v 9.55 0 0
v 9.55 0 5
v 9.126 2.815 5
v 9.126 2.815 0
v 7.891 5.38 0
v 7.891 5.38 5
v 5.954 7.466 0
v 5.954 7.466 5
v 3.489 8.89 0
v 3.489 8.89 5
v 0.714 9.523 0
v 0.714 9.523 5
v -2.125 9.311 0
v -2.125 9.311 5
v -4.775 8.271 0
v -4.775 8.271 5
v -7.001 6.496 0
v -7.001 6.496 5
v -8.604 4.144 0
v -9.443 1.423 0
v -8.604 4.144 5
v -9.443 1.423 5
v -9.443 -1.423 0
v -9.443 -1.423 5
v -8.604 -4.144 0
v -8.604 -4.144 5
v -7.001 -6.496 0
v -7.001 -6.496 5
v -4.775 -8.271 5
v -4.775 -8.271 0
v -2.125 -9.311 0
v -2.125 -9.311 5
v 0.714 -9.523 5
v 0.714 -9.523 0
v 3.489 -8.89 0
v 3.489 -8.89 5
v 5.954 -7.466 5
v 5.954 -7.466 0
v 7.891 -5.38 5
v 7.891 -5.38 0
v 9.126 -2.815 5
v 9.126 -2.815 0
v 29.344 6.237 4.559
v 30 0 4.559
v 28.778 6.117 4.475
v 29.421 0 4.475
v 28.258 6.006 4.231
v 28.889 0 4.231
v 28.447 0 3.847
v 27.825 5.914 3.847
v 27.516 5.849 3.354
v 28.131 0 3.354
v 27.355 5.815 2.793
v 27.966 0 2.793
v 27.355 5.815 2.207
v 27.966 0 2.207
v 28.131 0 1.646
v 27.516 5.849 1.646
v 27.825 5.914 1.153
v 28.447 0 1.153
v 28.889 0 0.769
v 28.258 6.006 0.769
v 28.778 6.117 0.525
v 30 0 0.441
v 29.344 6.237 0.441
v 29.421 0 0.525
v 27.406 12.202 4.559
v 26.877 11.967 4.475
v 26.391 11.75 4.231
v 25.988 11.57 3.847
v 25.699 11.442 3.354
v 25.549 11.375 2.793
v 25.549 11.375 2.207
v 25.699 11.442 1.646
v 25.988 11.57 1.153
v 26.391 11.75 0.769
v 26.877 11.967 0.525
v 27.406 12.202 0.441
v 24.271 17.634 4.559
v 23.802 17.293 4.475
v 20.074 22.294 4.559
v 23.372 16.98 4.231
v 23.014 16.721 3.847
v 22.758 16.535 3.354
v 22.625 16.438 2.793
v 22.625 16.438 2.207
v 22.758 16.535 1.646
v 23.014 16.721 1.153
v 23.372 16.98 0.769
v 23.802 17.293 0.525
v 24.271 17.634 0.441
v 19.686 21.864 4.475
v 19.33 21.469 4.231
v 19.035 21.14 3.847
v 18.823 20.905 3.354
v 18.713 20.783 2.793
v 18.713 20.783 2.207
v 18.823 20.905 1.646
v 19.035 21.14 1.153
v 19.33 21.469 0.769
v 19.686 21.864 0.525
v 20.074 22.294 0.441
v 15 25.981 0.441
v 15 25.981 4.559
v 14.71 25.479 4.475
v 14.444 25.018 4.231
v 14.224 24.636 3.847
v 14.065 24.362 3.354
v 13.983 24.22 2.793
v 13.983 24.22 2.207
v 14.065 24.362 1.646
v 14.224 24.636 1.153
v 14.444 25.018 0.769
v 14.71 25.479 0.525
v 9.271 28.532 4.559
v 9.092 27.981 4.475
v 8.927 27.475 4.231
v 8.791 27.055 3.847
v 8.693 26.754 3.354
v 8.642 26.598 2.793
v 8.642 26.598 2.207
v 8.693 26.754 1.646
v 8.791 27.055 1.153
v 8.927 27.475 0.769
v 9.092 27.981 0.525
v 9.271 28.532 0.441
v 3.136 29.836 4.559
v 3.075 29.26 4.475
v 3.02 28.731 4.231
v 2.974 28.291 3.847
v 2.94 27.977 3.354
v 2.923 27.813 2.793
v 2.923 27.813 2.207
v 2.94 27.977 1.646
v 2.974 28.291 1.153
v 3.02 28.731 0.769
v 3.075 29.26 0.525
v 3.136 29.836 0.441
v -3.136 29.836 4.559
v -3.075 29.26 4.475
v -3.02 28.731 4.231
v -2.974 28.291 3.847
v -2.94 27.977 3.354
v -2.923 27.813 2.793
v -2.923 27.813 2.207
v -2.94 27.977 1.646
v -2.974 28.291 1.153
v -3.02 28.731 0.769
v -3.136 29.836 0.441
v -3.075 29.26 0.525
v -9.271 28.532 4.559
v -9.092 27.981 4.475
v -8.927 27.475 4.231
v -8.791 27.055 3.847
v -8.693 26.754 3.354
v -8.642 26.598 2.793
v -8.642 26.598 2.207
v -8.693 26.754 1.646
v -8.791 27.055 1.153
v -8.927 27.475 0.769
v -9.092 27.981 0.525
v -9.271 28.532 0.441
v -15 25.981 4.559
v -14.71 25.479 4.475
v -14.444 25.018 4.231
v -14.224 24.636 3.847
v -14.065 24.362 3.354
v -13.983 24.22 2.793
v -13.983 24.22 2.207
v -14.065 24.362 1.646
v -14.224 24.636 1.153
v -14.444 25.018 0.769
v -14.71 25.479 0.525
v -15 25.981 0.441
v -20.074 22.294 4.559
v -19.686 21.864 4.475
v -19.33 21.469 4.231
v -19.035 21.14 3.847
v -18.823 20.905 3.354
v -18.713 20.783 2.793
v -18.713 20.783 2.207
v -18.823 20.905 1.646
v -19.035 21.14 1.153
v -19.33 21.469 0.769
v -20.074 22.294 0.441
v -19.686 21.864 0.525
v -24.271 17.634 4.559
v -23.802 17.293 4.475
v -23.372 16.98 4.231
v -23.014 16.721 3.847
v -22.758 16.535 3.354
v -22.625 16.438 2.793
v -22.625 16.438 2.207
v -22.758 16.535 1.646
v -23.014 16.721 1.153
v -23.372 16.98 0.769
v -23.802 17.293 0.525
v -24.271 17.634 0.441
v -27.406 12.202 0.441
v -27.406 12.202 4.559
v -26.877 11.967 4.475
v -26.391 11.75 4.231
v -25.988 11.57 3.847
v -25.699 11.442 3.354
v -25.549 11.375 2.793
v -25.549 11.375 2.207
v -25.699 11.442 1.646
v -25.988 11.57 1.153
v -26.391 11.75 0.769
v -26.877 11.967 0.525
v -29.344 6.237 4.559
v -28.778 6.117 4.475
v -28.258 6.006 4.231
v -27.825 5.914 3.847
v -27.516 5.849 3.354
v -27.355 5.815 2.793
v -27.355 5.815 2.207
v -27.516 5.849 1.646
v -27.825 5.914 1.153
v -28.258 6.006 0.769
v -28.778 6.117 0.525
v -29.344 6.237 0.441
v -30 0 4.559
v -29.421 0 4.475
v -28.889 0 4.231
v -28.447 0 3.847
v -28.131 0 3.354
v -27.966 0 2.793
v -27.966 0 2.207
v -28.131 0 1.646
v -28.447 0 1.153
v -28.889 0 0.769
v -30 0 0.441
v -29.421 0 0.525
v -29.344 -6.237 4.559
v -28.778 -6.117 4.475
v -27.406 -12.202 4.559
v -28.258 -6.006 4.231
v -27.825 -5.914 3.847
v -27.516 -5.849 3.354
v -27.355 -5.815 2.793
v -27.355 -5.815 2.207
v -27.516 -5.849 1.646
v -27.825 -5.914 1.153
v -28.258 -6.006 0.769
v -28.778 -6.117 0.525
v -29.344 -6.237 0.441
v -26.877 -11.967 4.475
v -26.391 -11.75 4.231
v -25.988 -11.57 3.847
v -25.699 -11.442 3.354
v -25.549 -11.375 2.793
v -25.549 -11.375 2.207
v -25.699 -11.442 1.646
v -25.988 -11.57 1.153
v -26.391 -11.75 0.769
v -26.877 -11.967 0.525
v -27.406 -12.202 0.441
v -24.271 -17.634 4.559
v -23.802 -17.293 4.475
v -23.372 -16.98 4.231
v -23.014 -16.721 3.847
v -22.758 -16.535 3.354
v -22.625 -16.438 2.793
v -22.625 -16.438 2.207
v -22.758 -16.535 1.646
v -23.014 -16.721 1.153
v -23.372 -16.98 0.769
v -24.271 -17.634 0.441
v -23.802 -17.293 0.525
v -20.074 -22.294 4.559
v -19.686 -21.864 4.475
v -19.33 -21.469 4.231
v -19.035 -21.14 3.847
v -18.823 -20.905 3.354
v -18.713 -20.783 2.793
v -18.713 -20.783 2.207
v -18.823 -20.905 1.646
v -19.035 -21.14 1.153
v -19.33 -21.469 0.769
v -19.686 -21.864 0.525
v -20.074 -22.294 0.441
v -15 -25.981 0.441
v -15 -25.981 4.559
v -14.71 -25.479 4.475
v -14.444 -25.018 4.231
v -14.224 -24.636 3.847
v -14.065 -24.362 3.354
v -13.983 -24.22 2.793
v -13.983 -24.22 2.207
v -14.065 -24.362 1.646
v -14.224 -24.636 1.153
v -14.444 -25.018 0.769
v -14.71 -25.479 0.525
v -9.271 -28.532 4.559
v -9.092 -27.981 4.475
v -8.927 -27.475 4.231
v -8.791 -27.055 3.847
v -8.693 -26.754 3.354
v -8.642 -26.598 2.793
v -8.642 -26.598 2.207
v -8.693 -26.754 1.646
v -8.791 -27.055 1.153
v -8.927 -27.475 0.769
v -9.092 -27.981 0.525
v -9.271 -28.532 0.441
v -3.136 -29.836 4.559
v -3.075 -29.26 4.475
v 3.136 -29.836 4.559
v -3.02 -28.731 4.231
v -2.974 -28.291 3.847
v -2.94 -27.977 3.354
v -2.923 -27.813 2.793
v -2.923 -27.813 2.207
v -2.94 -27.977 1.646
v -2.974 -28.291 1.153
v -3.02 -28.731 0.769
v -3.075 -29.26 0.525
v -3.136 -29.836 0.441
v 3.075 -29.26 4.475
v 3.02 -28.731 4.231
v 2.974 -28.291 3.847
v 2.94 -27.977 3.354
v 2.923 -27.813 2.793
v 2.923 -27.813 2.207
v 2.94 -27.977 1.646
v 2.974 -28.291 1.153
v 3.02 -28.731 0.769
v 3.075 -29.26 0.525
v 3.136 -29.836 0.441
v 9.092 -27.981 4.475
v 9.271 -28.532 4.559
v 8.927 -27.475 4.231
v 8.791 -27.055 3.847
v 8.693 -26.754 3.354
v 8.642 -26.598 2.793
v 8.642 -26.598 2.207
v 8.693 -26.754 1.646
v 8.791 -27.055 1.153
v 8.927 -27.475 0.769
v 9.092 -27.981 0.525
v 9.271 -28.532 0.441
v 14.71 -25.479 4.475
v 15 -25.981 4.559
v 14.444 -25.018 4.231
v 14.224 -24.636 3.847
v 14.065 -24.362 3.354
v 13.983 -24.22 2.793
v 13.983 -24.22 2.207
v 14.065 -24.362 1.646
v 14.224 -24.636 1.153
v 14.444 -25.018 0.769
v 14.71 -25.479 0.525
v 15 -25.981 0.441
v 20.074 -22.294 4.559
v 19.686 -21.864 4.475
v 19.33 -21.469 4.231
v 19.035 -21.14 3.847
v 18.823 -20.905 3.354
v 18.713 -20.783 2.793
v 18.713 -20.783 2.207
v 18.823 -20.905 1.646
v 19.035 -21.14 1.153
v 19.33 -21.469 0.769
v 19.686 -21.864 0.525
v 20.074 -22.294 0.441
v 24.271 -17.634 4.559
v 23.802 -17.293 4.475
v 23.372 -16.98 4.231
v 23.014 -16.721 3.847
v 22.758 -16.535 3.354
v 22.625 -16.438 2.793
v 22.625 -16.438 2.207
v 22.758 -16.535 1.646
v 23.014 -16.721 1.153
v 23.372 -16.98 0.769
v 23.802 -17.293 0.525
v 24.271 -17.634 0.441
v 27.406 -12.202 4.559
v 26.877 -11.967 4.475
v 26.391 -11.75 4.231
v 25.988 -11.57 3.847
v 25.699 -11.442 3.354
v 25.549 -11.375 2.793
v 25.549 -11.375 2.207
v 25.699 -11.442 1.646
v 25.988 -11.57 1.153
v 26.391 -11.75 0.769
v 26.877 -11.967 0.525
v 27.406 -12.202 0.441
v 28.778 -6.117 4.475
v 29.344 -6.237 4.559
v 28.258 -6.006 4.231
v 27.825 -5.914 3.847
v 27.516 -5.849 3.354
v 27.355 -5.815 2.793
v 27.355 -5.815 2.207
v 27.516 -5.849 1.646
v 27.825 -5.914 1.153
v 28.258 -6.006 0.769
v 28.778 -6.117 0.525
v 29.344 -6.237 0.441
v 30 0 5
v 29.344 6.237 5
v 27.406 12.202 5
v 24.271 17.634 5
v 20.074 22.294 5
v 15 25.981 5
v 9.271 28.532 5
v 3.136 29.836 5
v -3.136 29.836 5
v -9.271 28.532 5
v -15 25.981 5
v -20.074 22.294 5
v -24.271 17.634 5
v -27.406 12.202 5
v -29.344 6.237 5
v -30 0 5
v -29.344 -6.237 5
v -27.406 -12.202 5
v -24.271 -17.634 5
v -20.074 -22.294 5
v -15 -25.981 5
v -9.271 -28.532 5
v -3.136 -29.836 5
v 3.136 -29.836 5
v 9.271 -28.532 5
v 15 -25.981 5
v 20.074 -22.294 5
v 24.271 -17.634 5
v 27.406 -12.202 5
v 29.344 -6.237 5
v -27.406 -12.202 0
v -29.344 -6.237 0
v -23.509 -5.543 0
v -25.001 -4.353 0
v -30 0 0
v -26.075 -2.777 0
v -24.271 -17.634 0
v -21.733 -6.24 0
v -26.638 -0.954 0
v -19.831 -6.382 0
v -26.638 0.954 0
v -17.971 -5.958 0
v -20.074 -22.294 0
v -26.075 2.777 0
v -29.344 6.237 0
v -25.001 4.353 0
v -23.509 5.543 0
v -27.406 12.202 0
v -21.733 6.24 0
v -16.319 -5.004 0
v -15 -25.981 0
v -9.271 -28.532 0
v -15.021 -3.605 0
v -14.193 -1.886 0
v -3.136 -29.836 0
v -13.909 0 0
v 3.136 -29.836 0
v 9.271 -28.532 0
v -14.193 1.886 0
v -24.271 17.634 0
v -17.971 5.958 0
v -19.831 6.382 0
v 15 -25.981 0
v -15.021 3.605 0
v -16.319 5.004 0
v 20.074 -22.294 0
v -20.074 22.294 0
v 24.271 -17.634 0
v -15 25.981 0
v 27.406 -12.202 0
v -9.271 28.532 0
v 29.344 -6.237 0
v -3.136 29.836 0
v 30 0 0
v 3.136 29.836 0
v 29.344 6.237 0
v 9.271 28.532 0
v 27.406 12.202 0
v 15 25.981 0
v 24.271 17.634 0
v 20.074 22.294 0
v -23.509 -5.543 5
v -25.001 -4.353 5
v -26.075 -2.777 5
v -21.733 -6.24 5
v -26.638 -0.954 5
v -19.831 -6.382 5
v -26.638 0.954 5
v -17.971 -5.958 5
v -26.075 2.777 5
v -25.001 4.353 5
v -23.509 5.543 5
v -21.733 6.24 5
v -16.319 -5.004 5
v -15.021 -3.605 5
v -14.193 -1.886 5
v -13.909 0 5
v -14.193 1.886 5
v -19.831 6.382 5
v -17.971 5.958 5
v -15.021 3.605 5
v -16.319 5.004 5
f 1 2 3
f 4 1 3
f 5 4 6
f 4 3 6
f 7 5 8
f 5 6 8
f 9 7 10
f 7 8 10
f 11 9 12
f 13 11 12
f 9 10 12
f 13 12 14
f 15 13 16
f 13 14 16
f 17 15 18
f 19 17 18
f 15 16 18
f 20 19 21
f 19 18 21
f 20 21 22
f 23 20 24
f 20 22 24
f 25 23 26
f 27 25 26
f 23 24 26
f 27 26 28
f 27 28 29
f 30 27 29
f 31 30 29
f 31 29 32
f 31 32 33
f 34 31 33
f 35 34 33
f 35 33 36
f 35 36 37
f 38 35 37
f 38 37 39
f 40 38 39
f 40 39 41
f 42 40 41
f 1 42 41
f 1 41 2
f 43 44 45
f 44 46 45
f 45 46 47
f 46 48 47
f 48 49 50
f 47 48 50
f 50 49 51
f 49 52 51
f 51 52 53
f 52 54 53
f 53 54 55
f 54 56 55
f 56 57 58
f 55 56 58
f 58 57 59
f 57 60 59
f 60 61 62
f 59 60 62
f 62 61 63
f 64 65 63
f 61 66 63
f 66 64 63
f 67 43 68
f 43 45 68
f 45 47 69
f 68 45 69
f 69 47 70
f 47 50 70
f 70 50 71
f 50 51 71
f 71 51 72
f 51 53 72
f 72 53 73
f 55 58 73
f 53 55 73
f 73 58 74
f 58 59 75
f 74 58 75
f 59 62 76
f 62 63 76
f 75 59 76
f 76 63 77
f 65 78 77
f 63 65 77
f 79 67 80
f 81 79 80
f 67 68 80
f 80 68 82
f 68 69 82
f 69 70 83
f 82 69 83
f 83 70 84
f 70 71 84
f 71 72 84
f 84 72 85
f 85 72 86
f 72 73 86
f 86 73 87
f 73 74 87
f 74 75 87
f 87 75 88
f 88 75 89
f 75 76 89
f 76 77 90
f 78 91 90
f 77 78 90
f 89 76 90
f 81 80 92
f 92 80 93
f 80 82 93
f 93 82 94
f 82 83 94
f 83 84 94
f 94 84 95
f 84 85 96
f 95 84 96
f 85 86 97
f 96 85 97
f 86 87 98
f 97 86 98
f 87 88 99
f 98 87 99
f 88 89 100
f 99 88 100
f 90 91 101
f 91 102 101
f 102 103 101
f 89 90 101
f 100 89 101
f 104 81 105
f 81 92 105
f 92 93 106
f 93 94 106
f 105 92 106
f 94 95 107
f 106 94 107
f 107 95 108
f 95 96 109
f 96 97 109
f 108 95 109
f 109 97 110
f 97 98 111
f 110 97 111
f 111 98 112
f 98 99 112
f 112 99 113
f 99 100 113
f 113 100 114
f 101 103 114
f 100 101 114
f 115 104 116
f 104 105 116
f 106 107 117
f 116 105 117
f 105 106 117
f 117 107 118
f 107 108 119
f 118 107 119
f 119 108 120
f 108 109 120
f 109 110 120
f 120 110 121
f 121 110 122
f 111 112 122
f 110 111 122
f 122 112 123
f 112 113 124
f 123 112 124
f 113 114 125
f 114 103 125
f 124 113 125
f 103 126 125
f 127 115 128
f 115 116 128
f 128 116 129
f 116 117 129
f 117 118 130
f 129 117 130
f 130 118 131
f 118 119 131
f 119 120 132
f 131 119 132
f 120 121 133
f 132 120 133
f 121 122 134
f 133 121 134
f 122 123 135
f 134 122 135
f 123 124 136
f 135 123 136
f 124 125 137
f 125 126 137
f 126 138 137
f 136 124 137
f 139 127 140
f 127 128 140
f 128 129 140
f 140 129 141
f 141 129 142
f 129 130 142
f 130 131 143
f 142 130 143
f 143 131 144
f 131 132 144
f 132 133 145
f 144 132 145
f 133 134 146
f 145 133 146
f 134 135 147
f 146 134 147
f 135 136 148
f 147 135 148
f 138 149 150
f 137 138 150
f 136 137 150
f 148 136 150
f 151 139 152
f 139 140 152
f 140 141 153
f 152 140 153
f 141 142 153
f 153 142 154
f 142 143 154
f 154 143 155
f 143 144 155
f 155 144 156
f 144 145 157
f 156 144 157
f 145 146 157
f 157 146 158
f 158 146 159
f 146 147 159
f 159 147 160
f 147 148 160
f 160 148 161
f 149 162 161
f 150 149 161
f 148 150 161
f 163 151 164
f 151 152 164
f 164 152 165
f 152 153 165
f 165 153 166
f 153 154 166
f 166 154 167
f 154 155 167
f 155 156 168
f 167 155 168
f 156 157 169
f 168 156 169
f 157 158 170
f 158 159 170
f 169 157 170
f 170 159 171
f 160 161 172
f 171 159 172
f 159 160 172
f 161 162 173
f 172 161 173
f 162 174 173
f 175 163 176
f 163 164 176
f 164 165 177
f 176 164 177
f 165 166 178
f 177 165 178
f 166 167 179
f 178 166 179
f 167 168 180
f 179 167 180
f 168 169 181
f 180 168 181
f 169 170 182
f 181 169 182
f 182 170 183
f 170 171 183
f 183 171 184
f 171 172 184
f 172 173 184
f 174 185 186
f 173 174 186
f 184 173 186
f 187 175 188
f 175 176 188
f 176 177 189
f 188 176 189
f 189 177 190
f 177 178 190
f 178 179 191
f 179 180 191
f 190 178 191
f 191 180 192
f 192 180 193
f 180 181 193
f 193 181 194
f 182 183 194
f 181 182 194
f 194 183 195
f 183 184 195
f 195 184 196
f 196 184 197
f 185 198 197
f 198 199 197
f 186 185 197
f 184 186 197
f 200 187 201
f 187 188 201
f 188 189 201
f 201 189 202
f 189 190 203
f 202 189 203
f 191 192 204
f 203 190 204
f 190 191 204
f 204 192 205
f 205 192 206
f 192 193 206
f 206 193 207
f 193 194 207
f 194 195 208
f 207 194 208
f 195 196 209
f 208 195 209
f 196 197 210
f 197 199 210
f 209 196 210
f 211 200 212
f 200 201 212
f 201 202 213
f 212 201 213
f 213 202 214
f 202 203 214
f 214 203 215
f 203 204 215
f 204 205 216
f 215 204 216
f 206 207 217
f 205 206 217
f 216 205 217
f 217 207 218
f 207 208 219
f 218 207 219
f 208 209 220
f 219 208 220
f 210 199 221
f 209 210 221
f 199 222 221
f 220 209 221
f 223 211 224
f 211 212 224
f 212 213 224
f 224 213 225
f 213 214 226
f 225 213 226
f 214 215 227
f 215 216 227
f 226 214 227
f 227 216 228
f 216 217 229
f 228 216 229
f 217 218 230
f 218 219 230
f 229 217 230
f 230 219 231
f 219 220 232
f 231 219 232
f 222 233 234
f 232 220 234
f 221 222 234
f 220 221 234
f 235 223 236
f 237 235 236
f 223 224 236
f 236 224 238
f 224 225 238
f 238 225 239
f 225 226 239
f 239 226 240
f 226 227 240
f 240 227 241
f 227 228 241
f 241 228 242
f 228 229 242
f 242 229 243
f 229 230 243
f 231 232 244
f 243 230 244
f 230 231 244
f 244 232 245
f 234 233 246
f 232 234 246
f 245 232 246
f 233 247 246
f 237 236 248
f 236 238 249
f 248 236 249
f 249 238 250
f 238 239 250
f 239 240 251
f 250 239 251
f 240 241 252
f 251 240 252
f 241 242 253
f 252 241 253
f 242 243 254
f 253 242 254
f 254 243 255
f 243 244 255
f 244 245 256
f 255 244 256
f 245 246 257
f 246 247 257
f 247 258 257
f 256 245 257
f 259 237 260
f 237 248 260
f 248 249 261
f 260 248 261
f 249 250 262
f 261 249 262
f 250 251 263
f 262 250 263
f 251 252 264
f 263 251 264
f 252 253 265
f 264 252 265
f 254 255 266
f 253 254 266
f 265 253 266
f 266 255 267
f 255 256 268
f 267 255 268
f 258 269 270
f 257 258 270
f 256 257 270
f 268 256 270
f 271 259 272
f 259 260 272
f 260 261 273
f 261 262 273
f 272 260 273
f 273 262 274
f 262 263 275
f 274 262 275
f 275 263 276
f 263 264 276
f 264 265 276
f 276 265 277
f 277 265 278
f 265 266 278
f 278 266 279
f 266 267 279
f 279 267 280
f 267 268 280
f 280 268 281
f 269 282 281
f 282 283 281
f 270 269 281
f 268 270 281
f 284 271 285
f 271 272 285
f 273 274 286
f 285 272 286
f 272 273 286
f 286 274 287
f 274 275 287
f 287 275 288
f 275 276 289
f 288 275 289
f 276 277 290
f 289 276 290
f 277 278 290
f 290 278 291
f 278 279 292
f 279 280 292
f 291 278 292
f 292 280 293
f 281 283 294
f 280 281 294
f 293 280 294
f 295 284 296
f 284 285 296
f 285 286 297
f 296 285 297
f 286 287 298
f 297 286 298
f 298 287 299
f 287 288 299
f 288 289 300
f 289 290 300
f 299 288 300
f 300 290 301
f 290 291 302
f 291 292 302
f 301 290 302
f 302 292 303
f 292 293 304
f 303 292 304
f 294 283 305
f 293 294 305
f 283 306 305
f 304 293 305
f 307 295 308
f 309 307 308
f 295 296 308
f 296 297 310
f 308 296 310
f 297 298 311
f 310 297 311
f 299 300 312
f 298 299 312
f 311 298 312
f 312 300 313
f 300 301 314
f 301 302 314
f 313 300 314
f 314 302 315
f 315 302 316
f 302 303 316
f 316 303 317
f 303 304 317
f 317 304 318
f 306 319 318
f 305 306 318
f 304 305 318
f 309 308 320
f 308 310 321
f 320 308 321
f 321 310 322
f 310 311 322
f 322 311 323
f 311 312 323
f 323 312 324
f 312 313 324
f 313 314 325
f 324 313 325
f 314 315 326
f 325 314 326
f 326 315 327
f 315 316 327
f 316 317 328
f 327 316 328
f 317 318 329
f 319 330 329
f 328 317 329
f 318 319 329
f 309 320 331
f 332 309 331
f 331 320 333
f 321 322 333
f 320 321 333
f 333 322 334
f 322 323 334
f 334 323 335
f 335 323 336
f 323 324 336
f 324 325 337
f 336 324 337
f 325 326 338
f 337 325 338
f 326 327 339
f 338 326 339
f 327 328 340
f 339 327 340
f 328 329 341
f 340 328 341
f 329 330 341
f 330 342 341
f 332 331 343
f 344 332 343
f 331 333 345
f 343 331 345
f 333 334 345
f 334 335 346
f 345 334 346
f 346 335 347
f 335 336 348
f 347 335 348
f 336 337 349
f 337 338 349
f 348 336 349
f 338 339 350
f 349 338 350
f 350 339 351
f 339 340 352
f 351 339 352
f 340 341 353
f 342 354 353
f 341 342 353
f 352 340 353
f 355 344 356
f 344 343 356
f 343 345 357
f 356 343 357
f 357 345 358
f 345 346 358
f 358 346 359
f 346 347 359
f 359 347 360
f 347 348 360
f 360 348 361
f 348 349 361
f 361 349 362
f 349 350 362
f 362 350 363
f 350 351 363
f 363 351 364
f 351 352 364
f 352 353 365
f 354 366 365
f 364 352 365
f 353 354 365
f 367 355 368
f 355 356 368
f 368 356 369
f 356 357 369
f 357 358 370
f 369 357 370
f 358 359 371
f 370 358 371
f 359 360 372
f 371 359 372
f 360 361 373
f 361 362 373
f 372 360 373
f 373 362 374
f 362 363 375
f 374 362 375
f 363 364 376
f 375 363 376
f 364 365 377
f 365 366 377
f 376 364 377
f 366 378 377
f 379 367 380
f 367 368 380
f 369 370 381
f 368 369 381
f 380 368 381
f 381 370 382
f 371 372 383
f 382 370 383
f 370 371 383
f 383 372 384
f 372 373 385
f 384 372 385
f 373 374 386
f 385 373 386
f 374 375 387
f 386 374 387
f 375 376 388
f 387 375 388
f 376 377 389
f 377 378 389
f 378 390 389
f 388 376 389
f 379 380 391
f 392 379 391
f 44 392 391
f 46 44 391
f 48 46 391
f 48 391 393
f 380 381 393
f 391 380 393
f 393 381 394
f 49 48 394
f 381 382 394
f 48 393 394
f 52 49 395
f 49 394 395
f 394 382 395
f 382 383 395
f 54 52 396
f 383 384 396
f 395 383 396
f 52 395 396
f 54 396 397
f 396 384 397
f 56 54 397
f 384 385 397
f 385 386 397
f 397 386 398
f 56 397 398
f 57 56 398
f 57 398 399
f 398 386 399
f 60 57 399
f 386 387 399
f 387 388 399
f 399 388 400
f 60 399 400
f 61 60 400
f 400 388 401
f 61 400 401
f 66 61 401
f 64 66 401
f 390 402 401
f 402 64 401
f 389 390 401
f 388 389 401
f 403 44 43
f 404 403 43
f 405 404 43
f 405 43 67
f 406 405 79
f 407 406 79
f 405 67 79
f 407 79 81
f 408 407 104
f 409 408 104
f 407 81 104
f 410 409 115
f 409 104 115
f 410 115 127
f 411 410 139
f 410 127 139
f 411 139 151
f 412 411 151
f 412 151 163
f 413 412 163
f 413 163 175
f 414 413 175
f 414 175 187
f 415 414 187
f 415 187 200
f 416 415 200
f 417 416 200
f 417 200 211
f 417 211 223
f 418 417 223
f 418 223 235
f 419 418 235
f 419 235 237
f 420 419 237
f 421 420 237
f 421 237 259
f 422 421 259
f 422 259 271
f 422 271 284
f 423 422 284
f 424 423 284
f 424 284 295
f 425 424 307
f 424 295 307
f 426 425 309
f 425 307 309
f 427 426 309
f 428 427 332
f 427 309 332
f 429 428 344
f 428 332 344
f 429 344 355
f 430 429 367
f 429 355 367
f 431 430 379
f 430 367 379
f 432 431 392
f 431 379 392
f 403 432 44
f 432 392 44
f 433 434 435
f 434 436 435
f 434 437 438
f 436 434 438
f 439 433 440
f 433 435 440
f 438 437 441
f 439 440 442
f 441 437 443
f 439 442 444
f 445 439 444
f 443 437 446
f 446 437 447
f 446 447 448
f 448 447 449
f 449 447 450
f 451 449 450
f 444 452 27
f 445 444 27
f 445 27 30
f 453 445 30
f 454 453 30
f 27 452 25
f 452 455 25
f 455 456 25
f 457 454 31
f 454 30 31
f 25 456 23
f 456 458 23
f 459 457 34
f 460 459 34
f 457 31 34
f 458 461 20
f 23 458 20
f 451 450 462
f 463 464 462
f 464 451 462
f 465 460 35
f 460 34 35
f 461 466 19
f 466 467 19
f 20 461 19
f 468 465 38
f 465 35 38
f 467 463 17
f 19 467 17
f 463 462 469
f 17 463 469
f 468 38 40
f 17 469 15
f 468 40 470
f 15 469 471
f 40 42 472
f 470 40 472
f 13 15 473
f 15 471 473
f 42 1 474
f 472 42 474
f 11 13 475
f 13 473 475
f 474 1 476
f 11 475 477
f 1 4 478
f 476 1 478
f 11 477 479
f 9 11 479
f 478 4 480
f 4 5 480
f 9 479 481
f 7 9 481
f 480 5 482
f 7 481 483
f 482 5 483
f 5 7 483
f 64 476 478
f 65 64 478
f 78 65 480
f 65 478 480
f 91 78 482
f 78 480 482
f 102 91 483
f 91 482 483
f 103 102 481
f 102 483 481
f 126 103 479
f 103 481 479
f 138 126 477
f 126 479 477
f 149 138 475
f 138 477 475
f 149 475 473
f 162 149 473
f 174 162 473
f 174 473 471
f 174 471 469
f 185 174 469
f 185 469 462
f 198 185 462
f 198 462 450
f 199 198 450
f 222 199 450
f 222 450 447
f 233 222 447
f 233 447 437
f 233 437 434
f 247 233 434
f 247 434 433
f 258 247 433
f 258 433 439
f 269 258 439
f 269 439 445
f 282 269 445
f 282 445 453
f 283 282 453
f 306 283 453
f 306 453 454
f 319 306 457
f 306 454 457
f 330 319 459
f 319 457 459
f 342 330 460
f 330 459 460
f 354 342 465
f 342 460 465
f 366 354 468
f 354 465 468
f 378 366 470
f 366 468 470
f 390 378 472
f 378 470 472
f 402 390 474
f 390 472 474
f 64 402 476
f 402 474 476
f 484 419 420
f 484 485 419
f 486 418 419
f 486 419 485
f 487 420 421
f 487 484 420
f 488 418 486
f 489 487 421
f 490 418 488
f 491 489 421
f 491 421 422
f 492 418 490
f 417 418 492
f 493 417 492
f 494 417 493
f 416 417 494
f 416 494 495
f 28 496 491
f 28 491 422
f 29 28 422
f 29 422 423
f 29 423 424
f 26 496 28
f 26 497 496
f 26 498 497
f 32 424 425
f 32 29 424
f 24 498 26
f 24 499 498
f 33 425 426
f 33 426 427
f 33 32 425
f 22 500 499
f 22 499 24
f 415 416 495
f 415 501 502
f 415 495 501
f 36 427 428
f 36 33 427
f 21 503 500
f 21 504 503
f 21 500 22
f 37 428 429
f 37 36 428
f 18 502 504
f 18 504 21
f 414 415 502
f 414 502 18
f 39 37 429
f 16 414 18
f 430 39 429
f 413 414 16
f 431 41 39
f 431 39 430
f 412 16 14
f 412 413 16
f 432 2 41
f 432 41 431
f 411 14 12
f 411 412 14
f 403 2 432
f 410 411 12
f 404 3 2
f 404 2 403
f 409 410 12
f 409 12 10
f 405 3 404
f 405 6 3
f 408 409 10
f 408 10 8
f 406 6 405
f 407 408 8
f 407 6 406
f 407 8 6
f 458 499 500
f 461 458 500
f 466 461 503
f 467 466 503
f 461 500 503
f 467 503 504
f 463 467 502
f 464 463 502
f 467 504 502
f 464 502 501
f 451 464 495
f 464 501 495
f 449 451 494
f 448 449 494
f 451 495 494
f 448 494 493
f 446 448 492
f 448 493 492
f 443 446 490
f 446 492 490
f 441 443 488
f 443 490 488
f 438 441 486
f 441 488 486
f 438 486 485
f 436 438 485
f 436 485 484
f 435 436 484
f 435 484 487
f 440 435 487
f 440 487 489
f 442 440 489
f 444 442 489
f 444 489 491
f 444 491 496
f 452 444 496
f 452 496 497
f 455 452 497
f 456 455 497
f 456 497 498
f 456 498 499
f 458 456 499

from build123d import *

# Parameters (mm, degrees)
F0_R     = 30
F1_DEPTH = 5
F2_R     = 9.55
F3_DEPTH = 5.5
F4_R     = 2.0590521715
F6_R     = 6.4
F7_DEPTH = 5.1


with BuildPart() as f1:
    # F0 (on Top) → F1 (new body)
    with BuildSketch(Plane.XY):
        Circle(F0_R)
    extrude(amount=F1_DEPTH)

    # F2 (on face) → F3 (cut)
    with BuildSketch(Plane.XY.offset(5)):
        Circle(F2_R)
    extrude(amount=-F3_DEPTH, mode=Mode.SUBTRACT)

    # F5: sweep along a path in F0
    with BuildLine(Plane.XY) as f5_path:
        CenterArc((0, 0), 30, 0, 360)
    # F4 (on Right) → F5 (sweep, cut)
    with BuildSketch(Plane.YZ):
        with Locations((30.0044678152, 2.5)):
            Circle(F4_R)
    sweep(path=f5_path.line, mode=Mode.SUBTRACT)

    # F6 (on face) → F7 (cut)
    with BuildSketch(Plane.XY.offset(5)):
        with Locations((-20.3089937568, 0)):
            Circle(F6_R)
    extrude(amount=-F7_DEPTH, mode=Mode.SUBTRACT)


solid = f1.part
